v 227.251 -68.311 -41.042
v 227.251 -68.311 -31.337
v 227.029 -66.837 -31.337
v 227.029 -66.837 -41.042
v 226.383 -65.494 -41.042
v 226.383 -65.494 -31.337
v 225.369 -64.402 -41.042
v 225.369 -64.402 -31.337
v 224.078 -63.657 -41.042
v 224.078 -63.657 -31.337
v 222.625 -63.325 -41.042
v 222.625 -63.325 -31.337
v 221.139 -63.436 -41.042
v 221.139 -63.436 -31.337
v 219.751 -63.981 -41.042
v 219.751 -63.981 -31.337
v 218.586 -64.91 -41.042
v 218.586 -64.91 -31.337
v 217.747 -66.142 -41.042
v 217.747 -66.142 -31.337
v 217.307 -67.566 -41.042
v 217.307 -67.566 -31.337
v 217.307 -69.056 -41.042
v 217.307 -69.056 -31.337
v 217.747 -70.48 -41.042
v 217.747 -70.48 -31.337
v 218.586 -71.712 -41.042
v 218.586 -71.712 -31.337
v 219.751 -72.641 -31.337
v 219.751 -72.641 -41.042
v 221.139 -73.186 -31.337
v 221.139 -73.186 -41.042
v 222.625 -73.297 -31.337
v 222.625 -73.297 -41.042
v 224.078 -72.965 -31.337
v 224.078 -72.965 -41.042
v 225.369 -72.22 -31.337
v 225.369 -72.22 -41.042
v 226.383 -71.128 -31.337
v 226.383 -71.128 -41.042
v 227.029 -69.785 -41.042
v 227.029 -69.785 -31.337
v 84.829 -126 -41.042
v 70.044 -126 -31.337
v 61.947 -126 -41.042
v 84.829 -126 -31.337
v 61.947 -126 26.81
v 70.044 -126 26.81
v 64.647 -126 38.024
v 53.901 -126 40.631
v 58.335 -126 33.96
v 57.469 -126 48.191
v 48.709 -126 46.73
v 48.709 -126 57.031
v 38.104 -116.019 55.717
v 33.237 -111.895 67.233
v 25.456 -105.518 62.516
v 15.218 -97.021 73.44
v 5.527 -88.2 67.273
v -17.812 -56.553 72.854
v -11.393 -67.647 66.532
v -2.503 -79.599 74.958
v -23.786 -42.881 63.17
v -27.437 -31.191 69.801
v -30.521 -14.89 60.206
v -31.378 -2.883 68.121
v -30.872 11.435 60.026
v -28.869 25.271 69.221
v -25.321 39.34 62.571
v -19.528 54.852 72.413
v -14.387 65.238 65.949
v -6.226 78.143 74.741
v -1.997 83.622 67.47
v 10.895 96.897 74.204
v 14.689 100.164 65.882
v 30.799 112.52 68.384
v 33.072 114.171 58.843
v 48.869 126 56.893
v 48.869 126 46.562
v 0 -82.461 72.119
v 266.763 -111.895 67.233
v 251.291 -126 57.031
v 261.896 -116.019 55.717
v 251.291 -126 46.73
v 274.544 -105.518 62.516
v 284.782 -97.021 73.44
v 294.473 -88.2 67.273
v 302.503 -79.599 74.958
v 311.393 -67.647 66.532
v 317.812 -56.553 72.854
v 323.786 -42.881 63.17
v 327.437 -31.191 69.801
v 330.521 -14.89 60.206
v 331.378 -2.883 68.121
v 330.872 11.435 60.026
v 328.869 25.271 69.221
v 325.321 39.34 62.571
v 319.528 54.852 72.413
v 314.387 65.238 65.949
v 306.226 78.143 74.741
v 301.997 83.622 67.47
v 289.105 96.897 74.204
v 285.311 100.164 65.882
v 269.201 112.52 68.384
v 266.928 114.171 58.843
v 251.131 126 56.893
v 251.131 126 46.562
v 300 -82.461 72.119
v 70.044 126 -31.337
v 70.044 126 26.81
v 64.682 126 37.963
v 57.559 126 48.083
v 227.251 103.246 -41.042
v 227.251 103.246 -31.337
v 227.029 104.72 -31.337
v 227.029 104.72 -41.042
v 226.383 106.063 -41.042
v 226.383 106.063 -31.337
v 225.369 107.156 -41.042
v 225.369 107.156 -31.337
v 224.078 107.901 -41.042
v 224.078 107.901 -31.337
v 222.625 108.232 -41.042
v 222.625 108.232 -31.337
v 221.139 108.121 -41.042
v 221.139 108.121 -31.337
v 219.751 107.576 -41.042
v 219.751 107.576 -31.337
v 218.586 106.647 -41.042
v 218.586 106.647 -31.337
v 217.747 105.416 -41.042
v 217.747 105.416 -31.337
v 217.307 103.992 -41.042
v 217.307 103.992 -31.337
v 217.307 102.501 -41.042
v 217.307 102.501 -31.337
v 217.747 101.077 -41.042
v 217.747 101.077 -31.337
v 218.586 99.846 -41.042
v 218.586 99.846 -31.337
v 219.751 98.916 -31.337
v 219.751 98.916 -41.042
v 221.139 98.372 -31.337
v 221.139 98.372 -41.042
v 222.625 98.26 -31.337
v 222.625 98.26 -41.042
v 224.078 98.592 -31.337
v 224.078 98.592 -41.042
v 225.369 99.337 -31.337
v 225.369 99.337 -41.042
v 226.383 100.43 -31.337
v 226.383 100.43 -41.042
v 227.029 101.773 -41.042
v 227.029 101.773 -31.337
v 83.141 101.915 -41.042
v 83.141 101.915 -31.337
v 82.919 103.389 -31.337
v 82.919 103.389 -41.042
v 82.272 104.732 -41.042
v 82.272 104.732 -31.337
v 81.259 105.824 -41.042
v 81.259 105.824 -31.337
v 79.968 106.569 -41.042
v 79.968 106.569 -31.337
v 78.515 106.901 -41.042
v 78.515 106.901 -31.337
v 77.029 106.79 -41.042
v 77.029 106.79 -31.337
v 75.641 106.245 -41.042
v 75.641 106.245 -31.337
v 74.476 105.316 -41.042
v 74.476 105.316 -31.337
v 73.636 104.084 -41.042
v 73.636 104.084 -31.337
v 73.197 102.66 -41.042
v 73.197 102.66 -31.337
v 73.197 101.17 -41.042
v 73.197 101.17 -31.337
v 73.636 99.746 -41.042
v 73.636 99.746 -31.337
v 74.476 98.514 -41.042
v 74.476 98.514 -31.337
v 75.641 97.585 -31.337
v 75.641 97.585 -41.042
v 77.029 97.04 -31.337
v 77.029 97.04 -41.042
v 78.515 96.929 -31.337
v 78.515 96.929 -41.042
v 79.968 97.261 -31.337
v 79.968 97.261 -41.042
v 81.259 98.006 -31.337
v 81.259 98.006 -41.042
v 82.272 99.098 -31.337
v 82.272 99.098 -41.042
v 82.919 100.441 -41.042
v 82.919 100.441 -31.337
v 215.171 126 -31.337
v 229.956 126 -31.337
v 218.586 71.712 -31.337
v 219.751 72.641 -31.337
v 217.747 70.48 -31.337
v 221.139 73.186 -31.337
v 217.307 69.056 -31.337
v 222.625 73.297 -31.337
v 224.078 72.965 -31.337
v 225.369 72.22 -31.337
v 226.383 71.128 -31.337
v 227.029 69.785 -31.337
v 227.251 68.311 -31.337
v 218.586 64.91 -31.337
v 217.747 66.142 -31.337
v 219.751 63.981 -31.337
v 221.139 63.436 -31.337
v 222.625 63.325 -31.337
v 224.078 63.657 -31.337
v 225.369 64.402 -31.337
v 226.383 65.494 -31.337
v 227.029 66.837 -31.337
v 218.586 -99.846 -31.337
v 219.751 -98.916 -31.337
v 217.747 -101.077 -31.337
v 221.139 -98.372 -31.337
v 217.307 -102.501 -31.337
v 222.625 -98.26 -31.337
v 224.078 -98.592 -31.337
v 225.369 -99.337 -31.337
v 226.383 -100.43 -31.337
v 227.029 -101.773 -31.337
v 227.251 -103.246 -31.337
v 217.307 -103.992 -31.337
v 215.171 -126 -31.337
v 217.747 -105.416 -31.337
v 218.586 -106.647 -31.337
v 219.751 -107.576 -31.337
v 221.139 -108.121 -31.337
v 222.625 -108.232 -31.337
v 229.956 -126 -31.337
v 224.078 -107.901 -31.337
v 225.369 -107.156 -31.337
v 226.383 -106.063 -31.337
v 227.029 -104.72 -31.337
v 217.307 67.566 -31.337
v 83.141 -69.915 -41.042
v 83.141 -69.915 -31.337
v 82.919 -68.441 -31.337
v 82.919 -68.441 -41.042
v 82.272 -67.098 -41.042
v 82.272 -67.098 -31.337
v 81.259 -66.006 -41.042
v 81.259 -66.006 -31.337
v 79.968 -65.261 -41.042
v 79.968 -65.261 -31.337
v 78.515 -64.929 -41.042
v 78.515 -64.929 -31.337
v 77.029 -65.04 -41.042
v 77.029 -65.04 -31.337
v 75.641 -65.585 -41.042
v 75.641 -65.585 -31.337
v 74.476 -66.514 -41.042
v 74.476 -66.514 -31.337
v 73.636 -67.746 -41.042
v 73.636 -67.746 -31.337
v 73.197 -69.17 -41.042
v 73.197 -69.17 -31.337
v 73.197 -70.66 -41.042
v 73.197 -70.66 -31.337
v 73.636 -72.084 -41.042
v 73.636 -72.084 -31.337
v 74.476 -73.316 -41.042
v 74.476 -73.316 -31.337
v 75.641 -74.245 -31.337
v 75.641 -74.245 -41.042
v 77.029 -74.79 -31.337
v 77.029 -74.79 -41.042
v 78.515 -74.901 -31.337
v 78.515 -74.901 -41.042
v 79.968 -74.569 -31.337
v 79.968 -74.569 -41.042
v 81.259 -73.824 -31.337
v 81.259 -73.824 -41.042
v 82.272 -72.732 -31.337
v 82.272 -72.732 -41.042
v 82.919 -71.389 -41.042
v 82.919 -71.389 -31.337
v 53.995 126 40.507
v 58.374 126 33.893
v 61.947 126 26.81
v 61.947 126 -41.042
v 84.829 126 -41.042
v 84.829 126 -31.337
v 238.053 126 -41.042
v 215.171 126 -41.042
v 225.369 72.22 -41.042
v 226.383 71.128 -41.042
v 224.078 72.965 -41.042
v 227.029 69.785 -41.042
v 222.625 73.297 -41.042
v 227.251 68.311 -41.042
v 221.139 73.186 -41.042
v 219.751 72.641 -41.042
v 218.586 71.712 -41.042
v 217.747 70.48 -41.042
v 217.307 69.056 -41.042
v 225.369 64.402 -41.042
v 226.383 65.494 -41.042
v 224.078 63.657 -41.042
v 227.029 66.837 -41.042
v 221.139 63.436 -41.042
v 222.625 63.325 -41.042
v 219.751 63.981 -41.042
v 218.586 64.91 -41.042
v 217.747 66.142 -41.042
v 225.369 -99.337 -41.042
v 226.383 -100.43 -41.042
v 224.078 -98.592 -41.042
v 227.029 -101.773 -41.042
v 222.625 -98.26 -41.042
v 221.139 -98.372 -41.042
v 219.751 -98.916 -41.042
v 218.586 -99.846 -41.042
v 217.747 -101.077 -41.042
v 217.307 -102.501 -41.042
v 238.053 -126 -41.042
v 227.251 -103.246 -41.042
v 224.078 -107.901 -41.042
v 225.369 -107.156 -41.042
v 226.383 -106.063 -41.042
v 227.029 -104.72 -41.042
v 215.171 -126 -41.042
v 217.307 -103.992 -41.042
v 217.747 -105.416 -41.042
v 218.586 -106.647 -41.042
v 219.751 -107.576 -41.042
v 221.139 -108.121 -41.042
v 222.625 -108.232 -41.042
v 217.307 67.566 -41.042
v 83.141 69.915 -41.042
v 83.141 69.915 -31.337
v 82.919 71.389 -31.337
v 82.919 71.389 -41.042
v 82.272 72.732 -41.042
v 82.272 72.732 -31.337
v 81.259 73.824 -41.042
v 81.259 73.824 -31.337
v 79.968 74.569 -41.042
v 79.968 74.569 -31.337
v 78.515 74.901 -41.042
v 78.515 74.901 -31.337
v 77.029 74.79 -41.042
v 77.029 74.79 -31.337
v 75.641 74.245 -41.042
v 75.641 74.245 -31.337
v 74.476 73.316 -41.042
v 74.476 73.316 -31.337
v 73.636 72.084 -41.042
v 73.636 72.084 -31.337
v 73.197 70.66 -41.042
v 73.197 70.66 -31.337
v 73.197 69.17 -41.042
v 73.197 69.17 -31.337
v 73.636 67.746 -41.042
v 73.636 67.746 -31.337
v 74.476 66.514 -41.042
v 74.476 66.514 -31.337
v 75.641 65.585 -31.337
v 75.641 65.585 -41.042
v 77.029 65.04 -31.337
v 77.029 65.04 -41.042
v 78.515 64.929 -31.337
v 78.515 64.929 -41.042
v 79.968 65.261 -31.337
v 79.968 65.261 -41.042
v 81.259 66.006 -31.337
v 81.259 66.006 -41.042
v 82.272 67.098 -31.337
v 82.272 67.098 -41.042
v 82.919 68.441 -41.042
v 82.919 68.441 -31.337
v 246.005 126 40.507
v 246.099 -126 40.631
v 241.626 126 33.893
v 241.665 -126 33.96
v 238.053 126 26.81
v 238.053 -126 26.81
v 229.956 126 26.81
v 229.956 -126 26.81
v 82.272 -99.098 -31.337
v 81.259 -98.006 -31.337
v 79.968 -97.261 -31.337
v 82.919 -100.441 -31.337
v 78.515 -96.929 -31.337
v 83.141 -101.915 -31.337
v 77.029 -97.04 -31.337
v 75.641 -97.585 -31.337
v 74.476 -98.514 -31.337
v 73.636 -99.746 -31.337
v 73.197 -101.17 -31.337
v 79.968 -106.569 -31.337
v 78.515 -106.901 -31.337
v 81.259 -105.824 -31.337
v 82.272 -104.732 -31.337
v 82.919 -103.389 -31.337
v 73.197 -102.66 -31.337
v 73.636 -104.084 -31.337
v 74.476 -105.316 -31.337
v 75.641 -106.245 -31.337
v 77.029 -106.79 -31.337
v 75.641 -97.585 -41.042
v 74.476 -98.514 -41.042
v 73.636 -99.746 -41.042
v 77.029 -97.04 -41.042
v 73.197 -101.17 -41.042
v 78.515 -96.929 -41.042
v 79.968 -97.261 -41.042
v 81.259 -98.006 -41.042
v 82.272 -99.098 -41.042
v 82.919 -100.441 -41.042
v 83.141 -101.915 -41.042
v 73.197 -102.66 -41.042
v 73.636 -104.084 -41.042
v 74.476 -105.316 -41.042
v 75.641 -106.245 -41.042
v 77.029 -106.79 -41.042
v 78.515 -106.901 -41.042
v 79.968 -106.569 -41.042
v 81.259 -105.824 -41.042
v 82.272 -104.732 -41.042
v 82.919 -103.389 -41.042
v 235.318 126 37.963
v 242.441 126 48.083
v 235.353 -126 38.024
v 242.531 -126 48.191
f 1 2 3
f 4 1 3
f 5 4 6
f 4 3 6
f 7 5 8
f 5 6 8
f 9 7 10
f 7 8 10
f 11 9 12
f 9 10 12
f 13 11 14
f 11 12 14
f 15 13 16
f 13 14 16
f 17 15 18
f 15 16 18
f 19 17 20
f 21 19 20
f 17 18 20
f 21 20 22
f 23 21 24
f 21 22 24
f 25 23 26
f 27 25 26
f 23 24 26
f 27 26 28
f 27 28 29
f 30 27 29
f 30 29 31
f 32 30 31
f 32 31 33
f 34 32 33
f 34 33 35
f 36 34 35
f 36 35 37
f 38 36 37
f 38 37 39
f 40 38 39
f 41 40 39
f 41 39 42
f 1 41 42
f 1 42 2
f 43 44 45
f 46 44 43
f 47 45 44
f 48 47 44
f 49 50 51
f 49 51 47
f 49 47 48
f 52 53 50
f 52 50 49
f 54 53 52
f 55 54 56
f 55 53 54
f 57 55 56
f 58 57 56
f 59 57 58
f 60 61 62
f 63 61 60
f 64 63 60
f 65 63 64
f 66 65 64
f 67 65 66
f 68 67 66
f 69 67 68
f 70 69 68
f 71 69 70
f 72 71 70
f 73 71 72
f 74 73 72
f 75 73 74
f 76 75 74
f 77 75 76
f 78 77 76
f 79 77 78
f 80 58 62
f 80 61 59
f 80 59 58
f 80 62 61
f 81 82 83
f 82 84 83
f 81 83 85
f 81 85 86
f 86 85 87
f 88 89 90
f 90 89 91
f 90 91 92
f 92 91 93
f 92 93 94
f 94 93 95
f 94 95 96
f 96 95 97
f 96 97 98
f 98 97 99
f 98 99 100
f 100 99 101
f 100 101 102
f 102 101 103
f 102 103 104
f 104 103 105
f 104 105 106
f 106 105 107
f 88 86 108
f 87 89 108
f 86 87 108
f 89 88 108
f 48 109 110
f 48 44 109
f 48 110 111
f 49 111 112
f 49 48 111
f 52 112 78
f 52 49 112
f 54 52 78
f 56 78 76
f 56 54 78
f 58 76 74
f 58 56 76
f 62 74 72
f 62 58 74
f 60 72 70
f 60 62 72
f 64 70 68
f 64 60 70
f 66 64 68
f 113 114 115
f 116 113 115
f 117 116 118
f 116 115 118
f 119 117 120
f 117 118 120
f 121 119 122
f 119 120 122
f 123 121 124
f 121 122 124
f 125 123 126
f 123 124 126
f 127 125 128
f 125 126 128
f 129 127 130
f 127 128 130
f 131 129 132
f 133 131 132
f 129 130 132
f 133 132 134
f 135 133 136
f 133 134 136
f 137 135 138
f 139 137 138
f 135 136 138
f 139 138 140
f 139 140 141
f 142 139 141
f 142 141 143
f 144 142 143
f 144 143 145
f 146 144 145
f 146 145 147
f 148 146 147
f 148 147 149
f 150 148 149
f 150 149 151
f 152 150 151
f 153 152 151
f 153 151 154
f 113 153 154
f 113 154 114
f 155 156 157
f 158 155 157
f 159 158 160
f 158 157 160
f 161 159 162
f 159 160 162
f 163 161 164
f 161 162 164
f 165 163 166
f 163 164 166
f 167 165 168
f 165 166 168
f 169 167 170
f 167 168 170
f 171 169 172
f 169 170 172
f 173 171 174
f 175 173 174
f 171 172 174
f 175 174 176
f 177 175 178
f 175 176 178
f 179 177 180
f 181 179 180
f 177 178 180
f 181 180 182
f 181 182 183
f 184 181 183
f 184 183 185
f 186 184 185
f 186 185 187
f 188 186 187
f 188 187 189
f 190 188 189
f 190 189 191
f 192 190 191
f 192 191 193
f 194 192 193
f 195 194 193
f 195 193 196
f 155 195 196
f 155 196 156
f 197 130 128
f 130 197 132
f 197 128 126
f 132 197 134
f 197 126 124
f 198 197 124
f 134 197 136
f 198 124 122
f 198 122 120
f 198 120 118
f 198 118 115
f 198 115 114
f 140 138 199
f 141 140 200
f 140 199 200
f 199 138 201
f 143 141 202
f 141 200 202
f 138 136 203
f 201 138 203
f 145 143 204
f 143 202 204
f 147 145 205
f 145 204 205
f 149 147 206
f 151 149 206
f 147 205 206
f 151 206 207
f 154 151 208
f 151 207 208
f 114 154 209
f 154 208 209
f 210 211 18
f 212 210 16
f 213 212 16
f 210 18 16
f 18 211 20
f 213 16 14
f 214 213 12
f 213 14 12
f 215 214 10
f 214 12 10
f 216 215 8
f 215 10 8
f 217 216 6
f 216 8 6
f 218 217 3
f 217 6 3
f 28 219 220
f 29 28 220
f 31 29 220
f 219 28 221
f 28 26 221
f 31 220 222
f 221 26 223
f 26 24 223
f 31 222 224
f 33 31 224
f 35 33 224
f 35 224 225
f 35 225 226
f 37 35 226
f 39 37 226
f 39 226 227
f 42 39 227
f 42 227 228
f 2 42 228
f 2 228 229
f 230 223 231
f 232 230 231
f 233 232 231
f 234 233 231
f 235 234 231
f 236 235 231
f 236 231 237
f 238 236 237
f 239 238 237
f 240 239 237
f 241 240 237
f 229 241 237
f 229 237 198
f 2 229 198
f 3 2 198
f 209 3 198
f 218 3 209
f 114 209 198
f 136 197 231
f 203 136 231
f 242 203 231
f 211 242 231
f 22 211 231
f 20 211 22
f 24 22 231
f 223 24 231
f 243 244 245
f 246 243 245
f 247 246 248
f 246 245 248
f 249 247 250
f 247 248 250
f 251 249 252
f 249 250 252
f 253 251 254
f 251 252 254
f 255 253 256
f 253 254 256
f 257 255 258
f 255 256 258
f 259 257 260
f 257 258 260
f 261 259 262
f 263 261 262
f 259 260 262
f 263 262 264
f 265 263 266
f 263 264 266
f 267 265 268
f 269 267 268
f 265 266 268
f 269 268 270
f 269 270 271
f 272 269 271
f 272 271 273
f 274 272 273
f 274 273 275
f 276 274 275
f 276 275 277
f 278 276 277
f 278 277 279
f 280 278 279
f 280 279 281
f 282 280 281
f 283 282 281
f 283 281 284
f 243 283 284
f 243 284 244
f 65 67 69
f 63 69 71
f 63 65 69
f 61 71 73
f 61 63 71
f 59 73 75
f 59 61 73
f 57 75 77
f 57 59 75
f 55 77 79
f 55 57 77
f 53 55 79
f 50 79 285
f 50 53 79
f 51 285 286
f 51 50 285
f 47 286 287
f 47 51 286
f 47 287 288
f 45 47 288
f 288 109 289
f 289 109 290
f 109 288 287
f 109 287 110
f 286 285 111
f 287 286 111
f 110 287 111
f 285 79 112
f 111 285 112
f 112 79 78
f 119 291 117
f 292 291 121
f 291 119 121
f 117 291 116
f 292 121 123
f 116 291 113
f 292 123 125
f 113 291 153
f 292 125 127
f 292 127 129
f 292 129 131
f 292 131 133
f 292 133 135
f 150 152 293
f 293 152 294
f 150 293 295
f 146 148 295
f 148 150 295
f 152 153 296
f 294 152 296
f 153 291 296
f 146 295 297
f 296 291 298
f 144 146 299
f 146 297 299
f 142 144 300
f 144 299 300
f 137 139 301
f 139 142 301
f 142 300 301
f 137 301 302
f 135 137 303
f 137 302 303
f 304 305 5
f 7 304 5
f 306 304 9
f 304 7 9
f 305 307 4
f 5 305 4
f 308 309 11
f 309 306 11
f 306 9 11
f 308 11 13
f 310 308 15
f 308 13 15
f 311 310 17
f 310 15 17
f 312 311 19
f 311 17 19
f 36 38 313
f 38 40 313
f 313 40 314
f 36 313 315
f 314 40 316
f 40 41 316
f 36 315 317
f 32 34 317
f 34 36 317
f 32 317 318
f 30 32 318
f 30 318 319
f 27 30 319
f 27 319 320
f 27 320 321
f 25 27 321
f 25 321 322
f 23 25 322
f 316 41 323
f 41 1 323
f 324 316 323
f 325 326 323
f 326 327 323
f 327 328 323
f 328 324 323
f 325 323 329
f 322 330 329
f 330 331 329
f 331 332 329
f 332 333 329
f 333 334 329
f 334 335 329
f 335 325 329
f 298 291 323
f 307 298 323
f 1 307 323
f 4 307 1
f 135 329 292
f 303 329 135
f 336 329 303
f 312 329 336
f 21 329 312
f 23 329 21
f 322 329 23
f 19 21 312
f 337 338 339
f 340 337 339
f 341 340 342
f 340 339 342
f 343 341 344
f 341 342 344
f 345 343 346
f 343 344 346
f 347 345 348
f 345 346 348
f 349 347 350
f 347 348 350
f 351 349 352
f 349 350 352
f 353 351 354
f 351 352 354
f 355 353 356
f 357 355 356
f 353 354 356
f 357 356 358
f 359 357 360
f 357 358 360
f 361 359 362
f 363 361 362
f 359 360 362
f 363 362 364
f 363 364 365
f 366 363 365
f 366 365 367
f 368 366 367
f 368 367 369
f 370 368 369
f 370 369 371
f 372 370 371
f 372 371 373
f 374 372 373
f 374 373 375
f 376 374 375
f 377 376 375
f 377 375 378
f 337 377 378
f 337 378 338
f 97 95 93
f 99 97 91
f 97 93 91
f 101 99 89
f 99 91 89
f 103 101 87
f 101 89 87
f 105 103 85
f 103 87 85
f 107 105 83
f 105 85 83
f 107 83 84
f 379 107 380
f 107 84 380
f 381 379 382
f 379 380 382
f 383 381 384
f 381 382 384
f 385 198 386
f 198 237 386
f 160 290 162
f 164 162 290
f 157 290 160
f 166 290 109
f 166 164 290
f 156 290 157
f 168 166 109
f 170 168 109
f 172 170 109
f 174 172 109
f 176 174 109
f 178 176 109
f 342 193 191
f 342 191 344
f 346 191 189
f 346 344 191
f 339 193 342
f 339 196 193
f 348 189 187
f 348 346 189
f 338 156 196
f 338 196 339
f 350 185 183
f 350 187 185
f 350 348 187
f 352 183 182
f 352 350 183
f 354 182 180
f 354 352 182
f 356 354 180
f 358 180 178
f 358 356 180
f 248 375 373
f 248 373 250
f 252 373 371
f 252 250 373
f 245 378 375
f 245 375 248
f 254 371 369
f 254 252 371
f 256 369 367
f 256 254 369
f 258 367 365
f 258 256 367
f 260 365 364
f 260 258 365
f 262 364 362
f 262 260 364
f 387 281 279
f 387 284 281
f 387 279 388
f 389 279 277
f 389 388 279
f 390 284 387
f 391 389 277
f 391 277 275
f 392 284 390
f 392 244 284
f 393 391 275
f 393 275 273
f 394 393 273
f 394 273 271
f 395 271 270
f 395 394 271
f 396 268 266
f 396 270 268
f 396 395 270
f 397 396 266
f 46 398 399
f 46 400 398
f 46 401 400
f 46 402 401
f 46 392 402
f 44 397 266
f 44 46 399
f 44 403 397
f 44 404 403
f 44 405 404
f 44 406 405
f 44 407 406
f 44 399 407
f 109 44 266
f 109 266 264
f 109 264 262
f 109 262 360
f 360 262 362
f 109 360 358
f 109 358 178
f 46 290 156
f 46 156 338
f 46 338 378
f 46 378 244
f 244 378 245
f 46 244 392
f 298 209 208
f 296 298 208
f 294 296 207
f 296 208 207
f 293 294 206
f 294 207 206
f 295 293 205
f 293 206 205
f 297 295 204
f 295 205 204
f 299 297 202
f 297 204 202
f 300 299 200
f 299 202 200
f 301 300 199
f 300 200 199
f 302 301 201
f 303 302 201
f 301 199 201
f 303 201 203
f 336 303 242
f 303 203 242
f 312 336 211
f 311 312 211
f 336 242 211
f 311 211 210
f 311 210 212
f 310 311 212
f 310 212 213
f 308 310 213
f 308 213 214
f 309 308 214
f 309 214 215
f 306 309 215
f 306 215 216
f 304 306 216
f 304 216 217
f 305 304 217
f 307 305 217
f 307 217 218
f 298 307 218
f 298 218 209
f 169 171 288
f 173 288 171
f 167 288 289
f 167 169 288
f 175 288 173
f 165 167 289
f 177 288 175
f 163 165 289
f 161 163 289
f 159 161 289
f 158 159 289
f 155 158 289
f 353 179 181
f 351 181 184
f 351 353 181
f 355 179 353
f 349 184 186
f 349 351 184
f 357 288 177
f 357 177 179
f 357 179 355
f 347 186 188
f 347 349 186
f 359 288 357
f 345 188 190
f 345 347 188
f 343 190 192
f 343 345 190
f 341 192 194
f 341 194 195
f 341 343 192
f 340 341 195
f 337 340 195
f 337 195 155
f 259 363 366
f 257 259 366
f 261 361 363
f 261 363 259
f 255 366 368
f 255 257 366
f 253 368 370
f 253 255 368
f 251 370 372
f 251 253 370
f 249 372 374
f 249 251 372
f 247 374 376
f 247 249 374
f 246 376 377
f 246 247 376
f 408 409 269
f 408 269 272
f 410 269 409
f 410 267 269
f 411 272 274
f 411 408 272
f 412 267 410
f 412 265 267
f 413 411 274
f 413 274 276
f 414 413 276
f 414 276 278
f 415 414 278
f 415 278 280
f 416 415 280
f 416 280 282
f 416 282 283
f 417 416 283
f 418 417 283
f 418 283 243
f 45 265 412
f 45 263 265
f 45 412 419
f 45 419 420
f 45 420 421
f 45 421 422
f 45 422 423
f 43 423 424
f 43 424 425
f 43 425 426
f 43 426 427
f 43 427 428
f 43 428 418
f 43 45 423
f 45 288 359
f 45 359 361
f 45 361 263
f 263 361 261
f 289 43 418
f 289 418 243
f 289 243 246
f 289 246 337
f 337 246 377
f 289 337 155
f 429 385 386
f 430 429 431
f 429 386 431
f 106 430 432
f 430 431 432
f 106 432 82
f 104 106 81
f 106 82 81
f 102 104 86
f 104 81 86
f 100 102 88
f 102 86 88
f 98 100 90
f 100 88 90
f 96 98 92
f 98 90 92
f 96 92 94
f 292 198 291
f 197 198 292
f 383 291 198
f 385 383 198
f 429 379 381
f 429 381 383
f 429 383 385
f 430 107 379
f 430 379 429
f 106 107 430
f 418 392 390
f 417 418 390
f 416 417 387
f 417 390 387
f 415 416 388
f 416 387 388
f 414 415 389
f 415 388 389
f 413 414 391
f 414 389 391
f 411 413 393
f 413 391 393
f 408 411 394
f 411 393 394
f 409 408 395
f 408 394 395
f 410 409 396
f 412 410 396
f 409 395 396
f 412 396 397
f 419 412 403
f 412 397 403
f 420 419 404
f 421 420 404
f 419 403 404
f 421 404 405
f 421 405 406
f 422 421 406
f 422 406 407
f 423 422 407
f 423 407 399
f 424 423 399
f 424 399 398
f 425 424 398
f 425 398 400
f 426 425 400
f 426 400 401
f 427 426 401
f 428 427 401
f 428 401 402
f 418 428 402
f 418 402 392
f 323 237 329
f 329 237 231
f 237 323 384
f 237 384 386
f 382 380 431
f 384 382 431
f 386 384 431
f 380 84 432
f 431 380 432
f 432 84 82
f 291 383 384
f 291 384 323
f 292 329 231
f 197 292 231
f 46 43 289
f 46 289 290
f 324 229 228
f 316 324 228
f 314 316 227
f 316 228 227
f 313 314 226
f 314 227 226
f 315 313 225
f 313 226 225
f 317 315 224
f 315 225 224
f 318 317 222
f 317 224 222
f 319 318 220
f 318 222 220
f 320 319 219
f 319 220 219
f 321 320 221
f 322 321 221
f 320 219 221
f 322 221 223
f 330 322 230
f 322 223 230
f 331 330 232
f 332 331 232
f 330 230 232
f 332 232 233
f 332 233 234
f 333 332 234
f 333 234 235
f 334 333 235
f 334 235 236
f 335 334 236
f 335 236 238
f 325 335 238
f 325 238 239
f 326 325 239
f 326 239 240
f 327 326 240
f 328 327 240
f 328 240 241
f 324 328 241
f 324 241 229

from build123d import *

# Parameters (mm, degrees)
F1_DEPTH      = 126
F1_DEPTH_BACK = 126
F5_DEPTH      = 100
F8_R          = 5
F9_DEPTH      = 25
F10_R         = 5
F11_DEPTH     = 25


with BuildPart() as f1:
    # F0 (on Front) → F1 (new body, two sides)
    with BuildSketch(Plane.XZ) as f1_sk:
        with BuildLine():
            Line((70.0443179016, -12.7403034491), (70.0443179016, 26.8103250578))
            ThreePointArc((70.0443179016, 26.8103250578), (25.7463386006, 70.4423597607), (-36.2471125971, 65.6593240018))
            Line((-36.2471125971, 65.6593240018), (-36.2471125971, 56.9420479819))
            ThreePointArc((-36.2471125971, 56.9420479819), (19.8016134759, 64.5301952868), (61.9472071227, 26.8103250578))
            Line((61.9472071227, 26.8103250578), (61.9472071227, -31.3374493738))
            Line((61.9472071227, -31.3374493738), (61.9472071227, -41.0422040633))
            Line((61.9472071227, -41.0422040633), (84.8289564794, -41.0422040633))
            Line((84.8289564794, -41.0422040633), (84.8289564794, -31.3374493738))
            Line((84.8289564794, -31.3374493738), (70.0443179016, -31.3374493738))
            Line((70.0443179016, -31.3374493738), (70.0443179016, -12.7403034491))
        make_face()
    extrude(amount=F1_DEPTH)
    extrude(f1_sk.sketch, amount=-F1_DEPTH_BACK)


with BuildPart() as f3_1:
    # F3: instance of F1
    add(f1.part.mirror(Plane.YZ.offset(150)))


with BuildPart() as f1_1:
    add(f1.part)

    # F4 (on Top) → F5 (cut)
    with BuildSketch(Plane.XY):
        with BuildLine():
            add(Edge.make_bspline(
                [(59.5972202718, -139.9387419224), (46.2002525243, -117.7525978892), (-8.6174999533, -89.2650577127), (-43.2546205209, -0.5575538298), (-8.2149928368, 93.5951721342), (58.8972329523, 126.2318861842), (104.1034380676, 199.3212678603), (-181.8700393873, 214.3898682567), (-338.7476009134, -75.782878847), (-103.5955673017, -189.7681196613), (75.8103162653, -219.4153861522), (70.2841017032, -157.6368281737), (59.5972202718, -139.9387419224)],
                knots=[0, 0, 0, 0, 0.0839806149, 0.1706775515, 0.2589786096, 0.3396205922, 0.4002639236, 0.5360209171, 0.6823742902, 0.8192433062, 0.9330079097, 1, 1, 1, 1], degree=3))
        make_face()
    extrude(amount=F5_DEPTH, mode=Mode.SUBTRACT)


with BuildPart() as f7_1:
    # F7: instance of F1
    add(f1_1.part.mirror(Plane.YZ.offset(150)))

    # F10 (on face) → F11 (cut)
    with BuildSketch(Plane.XY.offset(-31.3374493738)):
        with Locations((222.251445055, -103.2463684678)):
            Circle(F10_R)
        with Locations((222.251445055, -68.3110430837)):
            Circle(F10_R)
        with Locations((222.251445055, 68.3110430837)):
            Circle(F10_R)
        with Locations((222.251445055, 103.2463684678)):
            Circle(F10_R)
    extrude(amount=-F11_DEPTH, mode=Mode.SUBTRACT)


with BuildPart() as f1_2:
    add(f1_1.part)

    # F8 (on face) → F9 (cut)
    with BuildSketch(Plane.XY.offset(-31.3374493738)):
        with Locations((78.141272068, -101.914934814)):
            Circle(F8_R)
        with Locations((78.141272068, -69.914996624)):
            Circle(F8_R)
        with Locations((78.141272068, 69.914996624)):
            Circle(F8_R)
        with Locations((78.141272068, 101.914934814)):
            Circle(F8_R)
    extrude(amount=-F9_DEPTH, mode=Mode.SUBTRACT)


solid = Compound([f7_1.part, f1_2.part])
